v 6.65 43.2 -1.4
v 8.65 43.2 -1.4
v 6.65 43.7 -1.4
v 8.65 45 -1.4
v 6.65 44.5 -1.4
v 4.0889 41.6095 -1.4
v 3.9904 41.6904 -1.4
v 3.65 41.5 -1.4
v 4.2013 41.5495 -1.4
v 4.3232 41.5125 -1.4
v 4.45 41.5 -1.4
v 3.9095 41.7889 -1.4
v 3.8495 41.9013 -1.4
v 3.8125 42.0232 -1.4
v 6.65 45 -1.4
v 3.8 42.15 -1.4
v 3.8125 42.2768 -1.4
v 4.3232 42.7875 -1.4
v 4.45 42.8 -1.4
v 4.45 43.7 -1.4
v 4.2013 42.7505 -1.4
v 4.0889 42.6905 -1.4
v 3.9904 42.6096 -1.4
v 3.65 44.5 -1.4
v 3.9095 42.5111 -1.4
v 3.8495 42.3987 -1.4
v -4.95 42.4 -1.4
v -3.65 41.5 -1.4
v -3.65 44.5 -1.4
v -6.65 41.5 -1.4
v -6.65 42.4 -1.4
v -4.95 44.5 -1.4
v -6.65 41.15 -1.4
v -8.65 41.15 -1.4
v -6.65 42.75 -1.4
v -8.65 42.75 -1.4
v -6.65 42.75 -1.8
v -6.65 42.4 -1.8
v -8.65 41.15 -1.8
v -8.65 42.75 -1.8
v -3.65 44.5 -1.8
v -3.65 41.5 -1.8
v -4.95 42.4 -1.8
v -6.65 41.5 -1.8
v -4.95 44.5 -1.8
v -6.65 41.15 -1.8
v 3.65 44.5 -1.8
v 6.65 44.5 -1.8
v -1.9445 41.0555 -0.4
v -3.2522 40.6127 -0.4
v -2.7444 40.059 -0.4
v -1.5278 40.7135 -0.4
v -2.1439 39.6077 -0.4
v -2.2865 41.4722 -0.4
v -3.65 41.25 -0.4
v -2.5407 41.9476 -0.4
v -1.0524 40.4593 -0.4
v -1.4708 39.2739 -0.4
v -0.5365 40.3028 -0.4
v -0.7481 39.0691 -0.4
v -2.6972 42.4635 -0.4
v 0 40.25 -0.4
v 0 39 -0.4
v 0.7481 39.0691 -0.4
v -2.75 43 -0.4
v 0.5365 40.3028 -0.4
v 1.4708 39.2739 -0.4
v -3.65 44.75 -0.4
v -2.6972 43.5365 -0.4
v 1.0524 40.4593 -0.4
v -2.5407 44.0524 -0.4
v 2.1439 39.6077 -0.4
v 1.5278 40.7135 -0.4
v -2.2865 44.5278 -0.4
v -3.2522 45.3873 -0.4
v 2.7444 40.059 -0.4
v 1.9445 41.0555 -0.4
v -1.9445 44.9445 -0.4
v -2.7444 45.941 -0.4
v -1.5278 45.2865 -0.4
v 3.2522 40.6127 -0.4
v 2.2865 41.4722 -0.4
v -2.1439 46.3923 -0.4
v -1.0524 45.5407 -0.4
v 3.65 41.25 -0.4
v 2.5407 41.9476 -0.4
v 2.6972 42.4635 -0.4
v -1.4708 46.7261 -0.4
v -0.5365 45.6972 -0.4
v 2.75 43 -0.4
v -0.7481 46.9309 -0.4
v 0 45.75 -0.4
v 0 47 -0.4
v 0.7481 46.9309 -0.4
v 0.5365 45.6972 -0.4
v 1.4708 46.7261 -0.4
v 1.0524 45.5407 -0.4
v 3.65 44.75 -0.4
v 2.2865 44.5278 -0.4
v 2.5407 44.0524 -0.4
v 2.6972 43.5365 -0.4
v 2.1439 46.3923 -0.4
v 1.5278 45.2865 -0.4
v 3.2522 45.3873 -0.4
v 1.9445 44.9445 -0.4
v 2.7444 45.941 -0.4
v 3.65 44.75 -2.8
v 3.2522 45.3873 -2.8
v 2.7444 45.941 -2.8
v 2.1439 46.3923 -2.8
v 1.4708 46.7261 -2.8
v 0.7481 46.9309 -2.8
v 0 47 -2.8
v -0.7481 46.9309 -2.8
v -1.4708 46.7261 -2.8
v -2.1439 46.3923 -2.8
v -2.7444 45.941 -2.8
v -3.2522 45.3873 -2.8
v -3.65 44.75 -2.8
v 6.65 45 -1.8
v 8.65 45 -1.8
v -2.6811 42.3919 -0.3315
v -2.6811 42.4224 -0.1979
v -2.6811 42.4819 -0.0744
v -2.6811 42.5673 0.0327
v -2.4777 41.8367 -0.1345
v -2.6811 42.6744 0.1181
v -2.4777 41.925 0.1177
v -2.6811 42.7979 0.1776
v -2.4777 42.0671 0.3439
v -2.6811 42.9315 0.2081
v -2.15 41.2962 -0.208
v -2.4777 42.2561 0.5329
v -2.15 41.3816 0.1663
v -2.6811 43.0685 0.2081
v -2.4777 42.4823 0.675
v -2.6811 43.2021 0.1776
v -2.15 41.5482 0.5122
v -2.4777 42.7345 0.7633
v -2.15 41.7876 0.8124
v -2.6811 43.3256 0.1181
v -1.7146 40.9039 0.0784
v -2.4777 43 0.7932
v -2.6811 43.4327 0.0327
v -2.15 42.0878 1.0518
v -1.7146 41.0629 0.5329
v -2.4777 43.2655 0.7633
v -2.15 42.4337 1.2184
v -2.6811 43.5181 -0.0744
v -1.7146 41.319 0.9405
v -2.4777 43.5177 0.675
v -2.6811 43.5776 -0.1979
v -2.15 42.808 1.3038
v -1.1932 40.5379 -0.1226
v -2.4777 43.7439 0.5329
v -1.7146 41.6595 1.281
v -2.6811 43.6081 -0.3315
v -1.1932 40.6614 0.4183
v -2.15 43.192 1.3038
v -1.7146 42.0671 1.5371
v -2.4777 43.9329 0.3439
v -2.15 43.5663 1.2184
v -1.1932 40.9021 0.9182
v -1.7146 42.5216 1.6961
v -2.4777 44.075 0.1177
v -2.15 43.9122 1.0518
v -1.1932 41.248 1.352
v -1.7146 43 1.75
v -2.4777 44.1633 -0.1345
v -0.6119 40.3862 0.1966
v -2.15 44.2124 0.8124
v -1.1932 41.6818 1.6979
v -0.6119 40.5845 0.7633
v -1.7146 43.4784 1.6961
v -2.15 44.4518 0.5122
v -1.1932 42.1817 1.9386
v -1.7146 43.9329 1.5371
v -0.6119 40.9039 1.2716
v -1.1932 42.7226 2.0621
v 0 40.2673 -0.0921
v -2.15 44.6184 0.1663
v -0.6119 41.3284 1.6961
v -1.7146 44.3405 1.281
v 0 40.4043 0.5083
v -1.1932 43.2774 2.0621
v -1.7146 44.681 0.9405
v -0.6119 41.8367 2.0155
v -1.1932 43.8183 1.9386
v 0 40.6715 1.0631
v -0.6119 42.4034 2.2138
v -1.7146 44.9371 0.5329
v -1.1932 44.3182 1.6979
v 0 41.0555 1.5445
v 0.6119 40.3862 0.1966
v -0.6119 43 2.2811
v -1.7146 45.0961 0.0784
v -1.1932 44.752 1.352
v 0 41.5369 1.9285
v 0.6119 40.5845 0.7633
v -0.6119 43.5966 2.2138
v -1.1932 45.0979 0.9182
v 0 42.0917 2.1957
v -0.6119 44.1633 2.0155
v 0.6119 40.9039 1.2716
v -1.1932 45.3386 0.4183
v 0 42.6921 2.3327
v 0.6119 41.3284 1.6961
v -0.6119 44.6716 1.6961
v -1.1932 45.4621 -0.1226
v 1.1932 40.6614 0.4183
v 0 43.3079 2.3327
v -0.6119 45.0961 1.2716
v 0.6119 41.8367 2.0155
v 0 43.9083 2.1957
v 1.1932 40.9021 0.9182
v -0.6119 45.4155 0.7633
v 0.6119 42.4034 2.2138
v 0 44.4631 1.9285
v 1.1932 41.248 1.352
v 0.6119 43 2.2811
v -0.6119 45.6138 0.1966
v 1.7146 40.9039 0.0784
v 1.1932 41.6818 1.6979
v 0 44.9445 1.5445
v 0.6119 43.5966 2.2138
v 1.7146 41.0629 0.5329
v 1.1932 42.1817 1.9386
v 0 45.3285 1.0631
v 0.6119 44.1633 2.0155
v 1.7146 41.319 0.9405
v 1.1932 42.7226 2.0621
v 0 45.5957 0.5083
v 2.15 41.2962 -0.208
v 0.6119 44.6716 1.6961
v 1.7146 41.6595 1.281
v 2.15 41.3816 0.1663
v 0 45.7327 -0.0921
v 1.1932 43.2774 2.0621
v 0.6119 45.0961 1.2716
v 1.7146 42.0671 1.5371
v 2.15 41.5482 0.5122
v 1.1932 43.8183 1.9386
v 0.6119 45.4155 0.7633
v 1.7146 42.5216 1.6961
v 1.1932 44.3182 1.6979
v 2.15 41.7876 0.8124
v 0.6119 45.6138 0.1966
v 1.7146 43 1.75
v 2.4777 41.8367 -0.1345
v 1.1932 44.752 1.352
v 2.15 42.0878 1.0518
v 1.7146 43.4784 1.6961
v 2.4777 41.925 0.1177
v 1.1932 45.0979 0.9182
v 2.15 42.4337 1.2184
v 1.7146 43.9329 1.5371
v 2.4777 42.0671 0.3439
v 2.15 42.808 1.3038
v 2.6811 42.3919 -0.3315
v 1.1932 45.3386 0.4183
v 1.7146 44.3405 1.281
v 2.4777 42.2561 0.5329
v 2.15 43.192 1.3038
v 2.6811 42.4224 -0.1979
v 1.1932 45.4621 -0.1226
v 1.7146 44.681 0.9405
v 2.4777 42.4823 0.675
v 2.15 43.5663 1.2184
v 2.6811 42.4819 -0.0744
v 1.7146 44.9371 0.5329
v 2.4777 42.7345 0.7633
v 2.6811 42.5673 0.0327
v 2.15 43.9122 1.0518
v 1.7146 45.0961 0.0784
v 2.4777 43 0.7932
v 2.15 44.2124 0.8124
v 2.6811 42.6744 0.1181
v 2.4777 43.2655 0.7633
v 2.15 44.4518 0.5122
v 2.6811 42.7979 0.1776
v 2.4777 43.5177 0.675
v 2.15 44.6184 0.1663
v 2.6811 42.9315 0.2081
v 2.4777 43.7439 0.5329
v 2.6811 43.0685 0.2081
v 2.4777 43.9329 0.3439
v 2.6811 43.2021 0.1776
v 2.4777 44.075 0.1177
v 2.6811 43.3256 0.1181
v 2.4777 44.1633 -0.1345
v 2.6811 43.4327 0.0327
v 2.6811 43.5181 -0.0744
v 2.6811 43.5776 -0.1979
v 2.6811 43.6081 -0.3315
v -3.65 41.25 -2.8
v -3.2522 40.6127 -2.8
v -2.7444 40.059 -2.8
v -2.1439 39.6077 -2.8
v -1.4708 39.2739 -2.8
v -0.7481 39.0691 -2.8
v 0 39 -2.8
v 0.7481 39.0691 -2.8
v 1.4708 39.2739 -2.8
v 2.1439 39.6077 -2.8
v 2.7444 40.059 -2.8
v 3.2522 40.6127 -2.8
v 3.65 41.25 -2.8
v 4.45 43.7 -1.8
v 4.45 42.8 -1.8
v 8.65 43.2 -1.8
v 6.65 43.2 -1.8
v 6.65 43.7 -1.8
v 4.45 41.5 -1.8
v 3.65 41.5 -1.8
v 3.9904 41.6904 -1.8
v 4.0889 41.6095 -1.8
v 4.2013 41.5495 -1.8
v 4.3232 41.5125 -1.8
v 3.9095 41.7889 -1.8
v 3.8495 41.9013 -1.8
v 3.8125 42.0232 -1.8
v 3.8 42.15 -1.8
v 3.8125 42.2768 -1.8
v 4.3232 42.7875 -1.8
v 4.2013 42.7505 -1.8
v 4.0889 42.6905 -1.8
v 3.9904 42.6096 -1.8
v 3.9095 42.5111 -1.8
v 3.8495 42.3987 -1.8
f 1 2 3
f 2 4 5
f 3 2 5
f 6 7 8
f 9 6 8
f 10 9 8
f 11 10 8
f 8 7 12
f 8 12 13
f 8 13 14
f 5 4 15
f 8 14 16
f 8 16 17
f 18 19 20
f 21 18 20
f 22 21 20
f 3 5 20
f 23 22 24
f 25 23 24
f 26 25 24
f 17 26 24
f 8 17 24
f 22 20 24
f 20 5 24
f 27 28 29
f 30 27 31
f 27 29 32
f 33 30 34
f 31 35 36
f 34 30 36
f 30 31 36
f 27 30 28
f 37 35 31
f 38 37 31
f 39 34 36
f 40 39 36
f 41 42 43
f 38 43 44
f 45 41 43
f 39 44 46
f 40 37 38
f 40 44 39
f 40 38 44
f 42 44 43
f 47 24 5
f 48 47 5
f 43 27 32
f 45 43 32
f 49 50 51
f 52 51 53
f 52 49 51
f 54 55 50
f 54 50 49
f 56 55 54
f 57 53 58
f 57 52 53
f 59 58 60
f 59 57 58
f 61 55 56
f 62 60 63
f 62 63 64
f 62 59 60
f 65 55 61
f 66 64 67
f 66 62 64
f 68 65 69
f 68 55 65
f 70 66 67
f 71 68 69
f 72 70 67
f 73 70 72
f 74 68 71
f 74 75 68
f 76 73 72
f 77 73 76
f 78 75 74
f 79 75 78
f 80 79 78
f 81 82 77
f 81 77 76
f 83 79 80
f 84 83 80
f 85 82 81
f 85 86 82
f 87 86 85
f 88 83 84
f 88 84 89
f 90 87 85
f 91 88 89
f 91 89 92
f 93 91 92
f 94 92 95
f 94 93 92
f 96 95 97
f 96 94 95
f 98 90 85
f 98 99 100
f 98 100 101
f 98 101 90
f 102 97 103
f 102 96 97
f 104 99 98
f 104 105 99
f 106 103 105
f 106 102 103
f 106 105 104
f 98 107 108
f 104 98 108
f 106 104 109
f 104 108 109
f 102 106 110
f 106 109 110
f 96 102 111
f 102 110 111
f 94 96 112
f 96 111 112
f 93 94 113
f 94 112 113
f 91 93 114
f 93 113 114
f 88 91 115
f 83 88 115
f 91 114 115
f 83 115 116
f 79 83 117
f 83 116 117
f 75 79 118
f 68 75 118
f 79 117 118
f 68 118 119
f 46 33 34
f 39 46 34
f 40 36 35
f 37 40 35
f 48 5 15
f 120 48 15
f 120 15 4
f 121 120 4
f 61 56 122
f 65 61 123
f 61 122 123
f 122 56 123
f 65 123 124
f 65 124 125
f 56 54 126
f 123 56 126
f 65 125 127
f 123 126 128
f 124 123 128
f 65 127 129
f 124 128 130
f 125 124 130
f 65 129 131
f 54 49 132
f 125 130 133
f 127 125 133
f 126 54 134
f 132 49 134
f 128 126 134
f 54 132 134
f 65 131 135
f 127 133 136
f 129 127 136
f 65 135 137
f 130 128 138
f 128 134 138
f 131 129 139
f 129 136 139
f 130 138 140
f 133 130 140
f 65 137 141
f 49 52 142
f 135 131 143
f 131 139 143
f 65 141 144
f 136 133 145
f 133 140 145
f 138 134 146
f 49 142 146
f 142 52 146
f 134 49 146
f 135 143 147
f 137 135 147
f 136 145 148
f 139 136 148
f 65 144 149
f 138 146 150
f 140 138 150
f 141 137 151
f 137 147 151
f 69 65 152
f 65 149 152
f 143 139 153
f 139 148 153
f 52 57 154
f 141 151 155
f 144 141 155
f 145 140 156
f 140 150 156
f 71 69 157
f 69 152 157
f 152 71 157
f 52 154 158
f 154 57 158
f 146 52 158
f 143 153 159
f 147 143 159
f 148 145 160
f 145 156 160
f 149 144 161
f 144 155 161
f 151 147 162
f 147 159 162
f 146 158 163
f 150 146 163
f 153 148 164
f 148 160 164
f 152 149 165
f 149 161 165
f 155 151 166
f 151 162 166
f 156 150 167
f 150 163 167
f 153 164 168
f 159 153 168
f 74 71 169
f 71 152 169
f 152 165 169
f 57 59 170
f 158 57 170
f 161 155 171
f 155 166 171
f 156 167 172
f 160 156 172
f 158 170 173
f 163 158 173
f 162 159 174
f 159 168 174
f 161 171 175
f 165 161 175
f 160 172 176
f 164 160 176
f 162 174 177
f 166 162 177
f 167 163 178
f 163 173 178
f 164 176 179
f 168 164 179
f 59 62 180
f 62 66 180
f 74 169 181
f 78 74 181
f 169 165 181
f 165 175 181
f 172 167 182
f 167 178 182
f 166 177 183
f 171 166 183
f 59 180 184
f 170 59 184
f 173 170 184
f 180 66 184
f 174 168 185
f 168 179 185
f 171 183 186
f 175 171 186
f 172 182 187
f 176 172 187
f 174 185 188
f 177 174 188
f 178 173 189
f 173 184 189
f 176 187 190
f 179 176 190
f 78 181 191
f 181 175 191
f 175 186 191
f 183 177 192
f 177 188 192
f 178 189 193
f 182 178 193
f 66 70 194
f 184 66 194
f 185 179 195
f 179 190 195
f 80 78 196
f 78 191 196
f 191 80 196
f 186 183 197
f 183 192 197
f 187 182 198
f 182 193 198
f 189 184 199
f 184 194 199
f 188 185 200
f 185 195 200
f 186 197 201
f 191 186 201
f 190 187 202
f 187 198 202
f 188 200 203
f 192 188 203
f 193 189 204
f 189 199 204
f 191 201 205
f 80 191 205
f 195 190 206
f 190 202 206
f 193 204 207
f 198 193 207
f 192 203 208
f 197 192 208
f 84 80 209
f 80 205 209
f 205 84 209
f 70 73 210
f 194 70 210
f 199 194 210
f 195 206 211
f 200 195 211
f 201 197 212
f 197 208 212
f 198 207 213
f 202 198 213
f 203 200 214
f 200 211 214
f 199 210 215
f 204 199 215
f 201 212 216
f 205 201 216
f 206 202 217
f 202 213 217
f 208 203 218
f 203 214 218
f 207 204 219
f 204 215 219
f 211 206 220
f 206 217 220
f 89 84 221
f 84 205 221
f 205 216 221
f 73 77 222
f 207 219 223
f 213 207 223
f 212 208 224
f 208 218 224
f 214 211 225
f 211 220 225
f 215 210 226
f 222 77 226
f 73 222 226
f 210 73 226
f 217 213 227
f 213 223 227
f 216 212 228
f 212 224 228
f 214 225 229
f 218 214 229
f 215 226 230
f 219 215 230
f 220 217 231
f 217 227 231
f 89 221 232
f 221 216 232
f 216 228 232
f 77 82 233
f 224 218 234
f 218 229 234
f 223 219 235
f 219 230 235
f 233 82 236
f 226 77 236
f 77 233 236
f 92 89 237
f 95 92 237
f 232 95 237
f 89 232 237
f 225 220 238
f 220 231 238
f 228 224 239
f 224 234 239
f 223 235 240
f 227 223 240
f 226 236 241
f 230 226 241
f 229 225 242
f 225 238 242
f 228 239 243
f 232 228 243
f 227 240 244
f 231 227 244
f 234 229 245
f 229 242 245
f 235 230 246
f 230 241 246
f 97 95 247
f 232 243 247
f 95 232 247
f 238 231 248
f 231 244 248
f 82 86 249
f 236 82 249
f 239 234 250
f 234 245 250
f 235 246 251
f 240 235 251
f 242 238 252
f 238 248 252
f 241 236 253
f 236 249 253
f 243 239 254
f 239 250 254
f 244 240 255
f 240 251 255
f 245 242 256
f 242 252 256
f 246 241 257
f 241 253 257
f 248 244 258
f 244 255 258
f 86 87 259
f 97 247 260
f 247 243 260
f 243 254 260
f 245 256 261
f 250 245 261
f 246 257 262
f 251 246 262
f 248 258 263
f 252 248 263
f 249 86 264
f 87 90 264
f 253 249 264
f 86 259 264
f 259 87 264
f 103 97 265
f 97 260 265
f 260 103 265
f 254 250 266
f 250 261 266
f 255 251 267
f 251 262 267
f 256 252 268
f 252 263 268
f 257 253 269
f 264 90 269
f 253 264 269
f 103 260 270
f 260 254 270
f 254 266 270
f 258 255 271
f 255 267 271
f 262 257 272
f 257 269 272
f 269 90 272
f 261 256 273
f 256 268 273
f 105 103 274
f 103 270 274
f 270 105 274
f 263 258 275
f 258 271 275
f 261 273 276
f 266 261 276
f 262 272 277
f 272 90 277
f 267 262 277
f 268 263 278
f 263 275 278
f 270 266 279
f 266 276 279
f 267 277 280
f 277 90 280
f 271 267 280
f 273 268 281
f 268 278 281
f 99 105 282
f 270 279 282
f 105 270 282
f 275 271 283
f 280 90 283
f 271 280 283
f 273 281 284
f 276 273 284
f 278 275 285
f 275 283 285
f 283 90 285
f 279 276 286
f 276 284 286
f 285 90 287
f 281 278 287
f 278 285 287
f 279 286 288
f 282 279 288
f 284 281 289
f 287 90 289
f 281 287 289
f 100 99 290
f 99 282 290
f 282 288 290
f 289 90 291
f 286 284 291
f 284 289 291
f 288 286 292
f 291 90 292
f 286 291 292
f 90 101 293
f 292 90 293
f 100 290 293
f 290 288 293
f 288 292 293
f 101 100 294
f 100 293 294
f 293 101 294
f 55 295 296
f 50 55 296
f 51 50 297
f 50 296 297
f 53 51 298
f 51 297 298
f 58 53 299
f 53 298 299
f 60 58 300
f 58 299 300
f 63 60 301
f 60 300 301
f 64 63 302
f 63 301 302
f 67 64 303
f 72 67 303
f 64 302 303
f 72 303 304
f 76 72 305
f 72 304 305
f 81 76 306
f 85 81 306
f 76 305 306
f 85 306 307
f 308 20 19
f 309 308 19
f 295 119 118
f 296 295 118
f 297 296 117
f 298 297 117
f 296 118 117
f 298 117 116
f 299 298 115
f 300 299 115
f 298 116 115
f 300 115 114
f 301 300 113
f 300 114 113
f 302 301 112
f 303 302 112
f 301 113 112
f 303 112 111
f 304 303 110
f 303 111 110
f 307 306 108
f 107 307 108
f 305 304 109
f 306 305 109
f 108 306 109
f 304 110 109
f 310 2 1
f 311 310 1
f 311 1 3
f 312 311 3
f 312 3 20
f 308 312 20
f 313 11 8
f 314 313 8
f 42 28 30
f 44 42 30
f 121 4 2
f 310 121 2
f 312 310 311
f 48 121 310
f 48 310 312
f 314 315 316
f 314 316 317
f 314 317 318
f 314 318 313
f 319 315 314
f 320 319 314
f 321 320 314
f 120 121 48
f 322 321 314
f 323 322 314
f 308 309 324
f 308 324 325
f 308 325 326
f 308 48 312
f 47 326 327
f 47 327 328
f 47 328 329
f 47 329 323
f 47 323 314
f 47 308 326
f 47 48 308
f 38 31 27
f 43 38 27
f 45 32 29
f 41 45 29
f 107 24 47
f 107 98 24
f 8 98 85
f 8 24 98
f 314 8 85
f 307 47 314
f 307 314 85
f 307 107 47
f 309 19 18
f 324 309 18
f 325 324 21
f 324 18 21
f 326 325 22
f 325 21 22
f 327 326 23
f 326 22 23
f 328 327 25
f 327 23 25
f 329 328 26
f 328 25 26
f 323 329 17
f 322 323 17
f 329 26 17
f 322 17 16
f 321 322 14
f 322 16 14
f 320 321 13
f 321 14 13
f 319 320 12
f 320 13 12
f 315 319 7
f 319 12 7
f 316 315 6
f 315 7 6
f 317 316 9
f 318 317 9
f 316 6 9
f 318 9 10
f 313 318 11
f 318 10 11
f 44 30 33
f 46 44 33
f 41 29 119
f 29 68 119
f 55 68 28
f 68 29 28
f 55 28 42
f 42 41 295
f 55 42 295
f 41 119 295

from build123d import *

# Parameters (mm, degrees)
REVOLUTION005_ANGLE     = -180
PAD023_DEPTH            = 0.4
BODY024_PLACEMENT_ANGLE = 180
PAD022_DEPTH            = 2.4


with BuildPart() as light005:
    # Sketch036 (on Face1 of ShapeBinder011) → Revolution005 (revolve)
    with BuildSketch(Plane.XY.offset(2.4)):
        with BuildLine():
            ThreePointArc((-2.75, 0), (0, -2.75), (2.75, 0))
            Line((-2.75, 0), (2.75, 0))
        make_face()
    revolve(axis=Axis((-2.75, 0, 2.4), (1, 0, 0)), revolution_arc=REVOLUTION005_ANGLE)


with BuildPart() as body024:
    # Sketch037 (on Face1 of ShapeBinder012) → Pad023 (new body)
    with BuildSketch(Plane(origin=(0, 0, 0), x_dir=(1, 0, 0), z_dir=(0, 0, -1))):
        with BuildLine():
            Line((3.65, 1.5), (6.65, 1.5))
            Line((6.65, 1.5), (6.65, 2))
            Line((6.65, 2), (8.65, 2))
            Line((8.65, 2), (8.65, 0.2))
            Line((8.65, 0.2), (6.65, 0.2))
            Line((6.65, 0.2), (6.65, 0.7))
            Line((6.65, 0.7), (4.45, 0.7))
            Line((4.45, 0.7), (4.45, -0.2))
            ThreePointArc((4.45, -0.2), (3.8, -0.85), (4.45, -1.5))
            Line((4.45, -1.5), (-6.65, -1.5))
            Line((-6.65, -1.5), (-6.65, -1.85))
            Line((-6.65, -1.85), (-8.65, -1.85))
            Line((-8.65, -1.85), (-8.65, -0.25))
            Line((-8.65, -0.25), (-6.65, -0.25))
            Line((-6.65, -0.25), (-6.65, -0.6))
            Line((-6.65, -0.6), (-4.95, -0.6))
            Line((-4.95, -0.6), (-4.95, 1.5))
            Line((-4.95, 1.5), (3.65, 1.5))
        make_face()
    extrude(amount=-PAD023_DEPTH)


with BuildPart() as body024_1:
    # Body024 placement: moved
    add(body024.part.moved(Location((0, 0, 1.4))).rotate(Axis((0, 0, 1.4), (1, 0, 0)), BODY024_PLACEMENT_ANGLE))


with BuildPart() as led6:
    # Sketch035 → Pad022 (new body)
    with BuildSketch(Plane.XY):
        with BuildLine():
            Line((-3.65, 1.75), (-3.65, -1.75))
            ThreePointArc((-3.65, -1.75), (0, -4), (3.65, -1.75))
            Line((3.65, 1.75), (3.65, -1.75))
            ThreePointArc((3.65, 1.75), (0, 4), (-3.65, 1.75))
        make_face()
    extrude(amount=PAD022_DEPTH)

    # Fusion006: union light005, Body024
    add(light005.part)
    add(body024_1.part)


with BuildPart() as led6_1:
    # Fusion006 placement: moved
    add(led6.part.moved(Location((0, 43, -2.8))))


solid = led6_1.part
